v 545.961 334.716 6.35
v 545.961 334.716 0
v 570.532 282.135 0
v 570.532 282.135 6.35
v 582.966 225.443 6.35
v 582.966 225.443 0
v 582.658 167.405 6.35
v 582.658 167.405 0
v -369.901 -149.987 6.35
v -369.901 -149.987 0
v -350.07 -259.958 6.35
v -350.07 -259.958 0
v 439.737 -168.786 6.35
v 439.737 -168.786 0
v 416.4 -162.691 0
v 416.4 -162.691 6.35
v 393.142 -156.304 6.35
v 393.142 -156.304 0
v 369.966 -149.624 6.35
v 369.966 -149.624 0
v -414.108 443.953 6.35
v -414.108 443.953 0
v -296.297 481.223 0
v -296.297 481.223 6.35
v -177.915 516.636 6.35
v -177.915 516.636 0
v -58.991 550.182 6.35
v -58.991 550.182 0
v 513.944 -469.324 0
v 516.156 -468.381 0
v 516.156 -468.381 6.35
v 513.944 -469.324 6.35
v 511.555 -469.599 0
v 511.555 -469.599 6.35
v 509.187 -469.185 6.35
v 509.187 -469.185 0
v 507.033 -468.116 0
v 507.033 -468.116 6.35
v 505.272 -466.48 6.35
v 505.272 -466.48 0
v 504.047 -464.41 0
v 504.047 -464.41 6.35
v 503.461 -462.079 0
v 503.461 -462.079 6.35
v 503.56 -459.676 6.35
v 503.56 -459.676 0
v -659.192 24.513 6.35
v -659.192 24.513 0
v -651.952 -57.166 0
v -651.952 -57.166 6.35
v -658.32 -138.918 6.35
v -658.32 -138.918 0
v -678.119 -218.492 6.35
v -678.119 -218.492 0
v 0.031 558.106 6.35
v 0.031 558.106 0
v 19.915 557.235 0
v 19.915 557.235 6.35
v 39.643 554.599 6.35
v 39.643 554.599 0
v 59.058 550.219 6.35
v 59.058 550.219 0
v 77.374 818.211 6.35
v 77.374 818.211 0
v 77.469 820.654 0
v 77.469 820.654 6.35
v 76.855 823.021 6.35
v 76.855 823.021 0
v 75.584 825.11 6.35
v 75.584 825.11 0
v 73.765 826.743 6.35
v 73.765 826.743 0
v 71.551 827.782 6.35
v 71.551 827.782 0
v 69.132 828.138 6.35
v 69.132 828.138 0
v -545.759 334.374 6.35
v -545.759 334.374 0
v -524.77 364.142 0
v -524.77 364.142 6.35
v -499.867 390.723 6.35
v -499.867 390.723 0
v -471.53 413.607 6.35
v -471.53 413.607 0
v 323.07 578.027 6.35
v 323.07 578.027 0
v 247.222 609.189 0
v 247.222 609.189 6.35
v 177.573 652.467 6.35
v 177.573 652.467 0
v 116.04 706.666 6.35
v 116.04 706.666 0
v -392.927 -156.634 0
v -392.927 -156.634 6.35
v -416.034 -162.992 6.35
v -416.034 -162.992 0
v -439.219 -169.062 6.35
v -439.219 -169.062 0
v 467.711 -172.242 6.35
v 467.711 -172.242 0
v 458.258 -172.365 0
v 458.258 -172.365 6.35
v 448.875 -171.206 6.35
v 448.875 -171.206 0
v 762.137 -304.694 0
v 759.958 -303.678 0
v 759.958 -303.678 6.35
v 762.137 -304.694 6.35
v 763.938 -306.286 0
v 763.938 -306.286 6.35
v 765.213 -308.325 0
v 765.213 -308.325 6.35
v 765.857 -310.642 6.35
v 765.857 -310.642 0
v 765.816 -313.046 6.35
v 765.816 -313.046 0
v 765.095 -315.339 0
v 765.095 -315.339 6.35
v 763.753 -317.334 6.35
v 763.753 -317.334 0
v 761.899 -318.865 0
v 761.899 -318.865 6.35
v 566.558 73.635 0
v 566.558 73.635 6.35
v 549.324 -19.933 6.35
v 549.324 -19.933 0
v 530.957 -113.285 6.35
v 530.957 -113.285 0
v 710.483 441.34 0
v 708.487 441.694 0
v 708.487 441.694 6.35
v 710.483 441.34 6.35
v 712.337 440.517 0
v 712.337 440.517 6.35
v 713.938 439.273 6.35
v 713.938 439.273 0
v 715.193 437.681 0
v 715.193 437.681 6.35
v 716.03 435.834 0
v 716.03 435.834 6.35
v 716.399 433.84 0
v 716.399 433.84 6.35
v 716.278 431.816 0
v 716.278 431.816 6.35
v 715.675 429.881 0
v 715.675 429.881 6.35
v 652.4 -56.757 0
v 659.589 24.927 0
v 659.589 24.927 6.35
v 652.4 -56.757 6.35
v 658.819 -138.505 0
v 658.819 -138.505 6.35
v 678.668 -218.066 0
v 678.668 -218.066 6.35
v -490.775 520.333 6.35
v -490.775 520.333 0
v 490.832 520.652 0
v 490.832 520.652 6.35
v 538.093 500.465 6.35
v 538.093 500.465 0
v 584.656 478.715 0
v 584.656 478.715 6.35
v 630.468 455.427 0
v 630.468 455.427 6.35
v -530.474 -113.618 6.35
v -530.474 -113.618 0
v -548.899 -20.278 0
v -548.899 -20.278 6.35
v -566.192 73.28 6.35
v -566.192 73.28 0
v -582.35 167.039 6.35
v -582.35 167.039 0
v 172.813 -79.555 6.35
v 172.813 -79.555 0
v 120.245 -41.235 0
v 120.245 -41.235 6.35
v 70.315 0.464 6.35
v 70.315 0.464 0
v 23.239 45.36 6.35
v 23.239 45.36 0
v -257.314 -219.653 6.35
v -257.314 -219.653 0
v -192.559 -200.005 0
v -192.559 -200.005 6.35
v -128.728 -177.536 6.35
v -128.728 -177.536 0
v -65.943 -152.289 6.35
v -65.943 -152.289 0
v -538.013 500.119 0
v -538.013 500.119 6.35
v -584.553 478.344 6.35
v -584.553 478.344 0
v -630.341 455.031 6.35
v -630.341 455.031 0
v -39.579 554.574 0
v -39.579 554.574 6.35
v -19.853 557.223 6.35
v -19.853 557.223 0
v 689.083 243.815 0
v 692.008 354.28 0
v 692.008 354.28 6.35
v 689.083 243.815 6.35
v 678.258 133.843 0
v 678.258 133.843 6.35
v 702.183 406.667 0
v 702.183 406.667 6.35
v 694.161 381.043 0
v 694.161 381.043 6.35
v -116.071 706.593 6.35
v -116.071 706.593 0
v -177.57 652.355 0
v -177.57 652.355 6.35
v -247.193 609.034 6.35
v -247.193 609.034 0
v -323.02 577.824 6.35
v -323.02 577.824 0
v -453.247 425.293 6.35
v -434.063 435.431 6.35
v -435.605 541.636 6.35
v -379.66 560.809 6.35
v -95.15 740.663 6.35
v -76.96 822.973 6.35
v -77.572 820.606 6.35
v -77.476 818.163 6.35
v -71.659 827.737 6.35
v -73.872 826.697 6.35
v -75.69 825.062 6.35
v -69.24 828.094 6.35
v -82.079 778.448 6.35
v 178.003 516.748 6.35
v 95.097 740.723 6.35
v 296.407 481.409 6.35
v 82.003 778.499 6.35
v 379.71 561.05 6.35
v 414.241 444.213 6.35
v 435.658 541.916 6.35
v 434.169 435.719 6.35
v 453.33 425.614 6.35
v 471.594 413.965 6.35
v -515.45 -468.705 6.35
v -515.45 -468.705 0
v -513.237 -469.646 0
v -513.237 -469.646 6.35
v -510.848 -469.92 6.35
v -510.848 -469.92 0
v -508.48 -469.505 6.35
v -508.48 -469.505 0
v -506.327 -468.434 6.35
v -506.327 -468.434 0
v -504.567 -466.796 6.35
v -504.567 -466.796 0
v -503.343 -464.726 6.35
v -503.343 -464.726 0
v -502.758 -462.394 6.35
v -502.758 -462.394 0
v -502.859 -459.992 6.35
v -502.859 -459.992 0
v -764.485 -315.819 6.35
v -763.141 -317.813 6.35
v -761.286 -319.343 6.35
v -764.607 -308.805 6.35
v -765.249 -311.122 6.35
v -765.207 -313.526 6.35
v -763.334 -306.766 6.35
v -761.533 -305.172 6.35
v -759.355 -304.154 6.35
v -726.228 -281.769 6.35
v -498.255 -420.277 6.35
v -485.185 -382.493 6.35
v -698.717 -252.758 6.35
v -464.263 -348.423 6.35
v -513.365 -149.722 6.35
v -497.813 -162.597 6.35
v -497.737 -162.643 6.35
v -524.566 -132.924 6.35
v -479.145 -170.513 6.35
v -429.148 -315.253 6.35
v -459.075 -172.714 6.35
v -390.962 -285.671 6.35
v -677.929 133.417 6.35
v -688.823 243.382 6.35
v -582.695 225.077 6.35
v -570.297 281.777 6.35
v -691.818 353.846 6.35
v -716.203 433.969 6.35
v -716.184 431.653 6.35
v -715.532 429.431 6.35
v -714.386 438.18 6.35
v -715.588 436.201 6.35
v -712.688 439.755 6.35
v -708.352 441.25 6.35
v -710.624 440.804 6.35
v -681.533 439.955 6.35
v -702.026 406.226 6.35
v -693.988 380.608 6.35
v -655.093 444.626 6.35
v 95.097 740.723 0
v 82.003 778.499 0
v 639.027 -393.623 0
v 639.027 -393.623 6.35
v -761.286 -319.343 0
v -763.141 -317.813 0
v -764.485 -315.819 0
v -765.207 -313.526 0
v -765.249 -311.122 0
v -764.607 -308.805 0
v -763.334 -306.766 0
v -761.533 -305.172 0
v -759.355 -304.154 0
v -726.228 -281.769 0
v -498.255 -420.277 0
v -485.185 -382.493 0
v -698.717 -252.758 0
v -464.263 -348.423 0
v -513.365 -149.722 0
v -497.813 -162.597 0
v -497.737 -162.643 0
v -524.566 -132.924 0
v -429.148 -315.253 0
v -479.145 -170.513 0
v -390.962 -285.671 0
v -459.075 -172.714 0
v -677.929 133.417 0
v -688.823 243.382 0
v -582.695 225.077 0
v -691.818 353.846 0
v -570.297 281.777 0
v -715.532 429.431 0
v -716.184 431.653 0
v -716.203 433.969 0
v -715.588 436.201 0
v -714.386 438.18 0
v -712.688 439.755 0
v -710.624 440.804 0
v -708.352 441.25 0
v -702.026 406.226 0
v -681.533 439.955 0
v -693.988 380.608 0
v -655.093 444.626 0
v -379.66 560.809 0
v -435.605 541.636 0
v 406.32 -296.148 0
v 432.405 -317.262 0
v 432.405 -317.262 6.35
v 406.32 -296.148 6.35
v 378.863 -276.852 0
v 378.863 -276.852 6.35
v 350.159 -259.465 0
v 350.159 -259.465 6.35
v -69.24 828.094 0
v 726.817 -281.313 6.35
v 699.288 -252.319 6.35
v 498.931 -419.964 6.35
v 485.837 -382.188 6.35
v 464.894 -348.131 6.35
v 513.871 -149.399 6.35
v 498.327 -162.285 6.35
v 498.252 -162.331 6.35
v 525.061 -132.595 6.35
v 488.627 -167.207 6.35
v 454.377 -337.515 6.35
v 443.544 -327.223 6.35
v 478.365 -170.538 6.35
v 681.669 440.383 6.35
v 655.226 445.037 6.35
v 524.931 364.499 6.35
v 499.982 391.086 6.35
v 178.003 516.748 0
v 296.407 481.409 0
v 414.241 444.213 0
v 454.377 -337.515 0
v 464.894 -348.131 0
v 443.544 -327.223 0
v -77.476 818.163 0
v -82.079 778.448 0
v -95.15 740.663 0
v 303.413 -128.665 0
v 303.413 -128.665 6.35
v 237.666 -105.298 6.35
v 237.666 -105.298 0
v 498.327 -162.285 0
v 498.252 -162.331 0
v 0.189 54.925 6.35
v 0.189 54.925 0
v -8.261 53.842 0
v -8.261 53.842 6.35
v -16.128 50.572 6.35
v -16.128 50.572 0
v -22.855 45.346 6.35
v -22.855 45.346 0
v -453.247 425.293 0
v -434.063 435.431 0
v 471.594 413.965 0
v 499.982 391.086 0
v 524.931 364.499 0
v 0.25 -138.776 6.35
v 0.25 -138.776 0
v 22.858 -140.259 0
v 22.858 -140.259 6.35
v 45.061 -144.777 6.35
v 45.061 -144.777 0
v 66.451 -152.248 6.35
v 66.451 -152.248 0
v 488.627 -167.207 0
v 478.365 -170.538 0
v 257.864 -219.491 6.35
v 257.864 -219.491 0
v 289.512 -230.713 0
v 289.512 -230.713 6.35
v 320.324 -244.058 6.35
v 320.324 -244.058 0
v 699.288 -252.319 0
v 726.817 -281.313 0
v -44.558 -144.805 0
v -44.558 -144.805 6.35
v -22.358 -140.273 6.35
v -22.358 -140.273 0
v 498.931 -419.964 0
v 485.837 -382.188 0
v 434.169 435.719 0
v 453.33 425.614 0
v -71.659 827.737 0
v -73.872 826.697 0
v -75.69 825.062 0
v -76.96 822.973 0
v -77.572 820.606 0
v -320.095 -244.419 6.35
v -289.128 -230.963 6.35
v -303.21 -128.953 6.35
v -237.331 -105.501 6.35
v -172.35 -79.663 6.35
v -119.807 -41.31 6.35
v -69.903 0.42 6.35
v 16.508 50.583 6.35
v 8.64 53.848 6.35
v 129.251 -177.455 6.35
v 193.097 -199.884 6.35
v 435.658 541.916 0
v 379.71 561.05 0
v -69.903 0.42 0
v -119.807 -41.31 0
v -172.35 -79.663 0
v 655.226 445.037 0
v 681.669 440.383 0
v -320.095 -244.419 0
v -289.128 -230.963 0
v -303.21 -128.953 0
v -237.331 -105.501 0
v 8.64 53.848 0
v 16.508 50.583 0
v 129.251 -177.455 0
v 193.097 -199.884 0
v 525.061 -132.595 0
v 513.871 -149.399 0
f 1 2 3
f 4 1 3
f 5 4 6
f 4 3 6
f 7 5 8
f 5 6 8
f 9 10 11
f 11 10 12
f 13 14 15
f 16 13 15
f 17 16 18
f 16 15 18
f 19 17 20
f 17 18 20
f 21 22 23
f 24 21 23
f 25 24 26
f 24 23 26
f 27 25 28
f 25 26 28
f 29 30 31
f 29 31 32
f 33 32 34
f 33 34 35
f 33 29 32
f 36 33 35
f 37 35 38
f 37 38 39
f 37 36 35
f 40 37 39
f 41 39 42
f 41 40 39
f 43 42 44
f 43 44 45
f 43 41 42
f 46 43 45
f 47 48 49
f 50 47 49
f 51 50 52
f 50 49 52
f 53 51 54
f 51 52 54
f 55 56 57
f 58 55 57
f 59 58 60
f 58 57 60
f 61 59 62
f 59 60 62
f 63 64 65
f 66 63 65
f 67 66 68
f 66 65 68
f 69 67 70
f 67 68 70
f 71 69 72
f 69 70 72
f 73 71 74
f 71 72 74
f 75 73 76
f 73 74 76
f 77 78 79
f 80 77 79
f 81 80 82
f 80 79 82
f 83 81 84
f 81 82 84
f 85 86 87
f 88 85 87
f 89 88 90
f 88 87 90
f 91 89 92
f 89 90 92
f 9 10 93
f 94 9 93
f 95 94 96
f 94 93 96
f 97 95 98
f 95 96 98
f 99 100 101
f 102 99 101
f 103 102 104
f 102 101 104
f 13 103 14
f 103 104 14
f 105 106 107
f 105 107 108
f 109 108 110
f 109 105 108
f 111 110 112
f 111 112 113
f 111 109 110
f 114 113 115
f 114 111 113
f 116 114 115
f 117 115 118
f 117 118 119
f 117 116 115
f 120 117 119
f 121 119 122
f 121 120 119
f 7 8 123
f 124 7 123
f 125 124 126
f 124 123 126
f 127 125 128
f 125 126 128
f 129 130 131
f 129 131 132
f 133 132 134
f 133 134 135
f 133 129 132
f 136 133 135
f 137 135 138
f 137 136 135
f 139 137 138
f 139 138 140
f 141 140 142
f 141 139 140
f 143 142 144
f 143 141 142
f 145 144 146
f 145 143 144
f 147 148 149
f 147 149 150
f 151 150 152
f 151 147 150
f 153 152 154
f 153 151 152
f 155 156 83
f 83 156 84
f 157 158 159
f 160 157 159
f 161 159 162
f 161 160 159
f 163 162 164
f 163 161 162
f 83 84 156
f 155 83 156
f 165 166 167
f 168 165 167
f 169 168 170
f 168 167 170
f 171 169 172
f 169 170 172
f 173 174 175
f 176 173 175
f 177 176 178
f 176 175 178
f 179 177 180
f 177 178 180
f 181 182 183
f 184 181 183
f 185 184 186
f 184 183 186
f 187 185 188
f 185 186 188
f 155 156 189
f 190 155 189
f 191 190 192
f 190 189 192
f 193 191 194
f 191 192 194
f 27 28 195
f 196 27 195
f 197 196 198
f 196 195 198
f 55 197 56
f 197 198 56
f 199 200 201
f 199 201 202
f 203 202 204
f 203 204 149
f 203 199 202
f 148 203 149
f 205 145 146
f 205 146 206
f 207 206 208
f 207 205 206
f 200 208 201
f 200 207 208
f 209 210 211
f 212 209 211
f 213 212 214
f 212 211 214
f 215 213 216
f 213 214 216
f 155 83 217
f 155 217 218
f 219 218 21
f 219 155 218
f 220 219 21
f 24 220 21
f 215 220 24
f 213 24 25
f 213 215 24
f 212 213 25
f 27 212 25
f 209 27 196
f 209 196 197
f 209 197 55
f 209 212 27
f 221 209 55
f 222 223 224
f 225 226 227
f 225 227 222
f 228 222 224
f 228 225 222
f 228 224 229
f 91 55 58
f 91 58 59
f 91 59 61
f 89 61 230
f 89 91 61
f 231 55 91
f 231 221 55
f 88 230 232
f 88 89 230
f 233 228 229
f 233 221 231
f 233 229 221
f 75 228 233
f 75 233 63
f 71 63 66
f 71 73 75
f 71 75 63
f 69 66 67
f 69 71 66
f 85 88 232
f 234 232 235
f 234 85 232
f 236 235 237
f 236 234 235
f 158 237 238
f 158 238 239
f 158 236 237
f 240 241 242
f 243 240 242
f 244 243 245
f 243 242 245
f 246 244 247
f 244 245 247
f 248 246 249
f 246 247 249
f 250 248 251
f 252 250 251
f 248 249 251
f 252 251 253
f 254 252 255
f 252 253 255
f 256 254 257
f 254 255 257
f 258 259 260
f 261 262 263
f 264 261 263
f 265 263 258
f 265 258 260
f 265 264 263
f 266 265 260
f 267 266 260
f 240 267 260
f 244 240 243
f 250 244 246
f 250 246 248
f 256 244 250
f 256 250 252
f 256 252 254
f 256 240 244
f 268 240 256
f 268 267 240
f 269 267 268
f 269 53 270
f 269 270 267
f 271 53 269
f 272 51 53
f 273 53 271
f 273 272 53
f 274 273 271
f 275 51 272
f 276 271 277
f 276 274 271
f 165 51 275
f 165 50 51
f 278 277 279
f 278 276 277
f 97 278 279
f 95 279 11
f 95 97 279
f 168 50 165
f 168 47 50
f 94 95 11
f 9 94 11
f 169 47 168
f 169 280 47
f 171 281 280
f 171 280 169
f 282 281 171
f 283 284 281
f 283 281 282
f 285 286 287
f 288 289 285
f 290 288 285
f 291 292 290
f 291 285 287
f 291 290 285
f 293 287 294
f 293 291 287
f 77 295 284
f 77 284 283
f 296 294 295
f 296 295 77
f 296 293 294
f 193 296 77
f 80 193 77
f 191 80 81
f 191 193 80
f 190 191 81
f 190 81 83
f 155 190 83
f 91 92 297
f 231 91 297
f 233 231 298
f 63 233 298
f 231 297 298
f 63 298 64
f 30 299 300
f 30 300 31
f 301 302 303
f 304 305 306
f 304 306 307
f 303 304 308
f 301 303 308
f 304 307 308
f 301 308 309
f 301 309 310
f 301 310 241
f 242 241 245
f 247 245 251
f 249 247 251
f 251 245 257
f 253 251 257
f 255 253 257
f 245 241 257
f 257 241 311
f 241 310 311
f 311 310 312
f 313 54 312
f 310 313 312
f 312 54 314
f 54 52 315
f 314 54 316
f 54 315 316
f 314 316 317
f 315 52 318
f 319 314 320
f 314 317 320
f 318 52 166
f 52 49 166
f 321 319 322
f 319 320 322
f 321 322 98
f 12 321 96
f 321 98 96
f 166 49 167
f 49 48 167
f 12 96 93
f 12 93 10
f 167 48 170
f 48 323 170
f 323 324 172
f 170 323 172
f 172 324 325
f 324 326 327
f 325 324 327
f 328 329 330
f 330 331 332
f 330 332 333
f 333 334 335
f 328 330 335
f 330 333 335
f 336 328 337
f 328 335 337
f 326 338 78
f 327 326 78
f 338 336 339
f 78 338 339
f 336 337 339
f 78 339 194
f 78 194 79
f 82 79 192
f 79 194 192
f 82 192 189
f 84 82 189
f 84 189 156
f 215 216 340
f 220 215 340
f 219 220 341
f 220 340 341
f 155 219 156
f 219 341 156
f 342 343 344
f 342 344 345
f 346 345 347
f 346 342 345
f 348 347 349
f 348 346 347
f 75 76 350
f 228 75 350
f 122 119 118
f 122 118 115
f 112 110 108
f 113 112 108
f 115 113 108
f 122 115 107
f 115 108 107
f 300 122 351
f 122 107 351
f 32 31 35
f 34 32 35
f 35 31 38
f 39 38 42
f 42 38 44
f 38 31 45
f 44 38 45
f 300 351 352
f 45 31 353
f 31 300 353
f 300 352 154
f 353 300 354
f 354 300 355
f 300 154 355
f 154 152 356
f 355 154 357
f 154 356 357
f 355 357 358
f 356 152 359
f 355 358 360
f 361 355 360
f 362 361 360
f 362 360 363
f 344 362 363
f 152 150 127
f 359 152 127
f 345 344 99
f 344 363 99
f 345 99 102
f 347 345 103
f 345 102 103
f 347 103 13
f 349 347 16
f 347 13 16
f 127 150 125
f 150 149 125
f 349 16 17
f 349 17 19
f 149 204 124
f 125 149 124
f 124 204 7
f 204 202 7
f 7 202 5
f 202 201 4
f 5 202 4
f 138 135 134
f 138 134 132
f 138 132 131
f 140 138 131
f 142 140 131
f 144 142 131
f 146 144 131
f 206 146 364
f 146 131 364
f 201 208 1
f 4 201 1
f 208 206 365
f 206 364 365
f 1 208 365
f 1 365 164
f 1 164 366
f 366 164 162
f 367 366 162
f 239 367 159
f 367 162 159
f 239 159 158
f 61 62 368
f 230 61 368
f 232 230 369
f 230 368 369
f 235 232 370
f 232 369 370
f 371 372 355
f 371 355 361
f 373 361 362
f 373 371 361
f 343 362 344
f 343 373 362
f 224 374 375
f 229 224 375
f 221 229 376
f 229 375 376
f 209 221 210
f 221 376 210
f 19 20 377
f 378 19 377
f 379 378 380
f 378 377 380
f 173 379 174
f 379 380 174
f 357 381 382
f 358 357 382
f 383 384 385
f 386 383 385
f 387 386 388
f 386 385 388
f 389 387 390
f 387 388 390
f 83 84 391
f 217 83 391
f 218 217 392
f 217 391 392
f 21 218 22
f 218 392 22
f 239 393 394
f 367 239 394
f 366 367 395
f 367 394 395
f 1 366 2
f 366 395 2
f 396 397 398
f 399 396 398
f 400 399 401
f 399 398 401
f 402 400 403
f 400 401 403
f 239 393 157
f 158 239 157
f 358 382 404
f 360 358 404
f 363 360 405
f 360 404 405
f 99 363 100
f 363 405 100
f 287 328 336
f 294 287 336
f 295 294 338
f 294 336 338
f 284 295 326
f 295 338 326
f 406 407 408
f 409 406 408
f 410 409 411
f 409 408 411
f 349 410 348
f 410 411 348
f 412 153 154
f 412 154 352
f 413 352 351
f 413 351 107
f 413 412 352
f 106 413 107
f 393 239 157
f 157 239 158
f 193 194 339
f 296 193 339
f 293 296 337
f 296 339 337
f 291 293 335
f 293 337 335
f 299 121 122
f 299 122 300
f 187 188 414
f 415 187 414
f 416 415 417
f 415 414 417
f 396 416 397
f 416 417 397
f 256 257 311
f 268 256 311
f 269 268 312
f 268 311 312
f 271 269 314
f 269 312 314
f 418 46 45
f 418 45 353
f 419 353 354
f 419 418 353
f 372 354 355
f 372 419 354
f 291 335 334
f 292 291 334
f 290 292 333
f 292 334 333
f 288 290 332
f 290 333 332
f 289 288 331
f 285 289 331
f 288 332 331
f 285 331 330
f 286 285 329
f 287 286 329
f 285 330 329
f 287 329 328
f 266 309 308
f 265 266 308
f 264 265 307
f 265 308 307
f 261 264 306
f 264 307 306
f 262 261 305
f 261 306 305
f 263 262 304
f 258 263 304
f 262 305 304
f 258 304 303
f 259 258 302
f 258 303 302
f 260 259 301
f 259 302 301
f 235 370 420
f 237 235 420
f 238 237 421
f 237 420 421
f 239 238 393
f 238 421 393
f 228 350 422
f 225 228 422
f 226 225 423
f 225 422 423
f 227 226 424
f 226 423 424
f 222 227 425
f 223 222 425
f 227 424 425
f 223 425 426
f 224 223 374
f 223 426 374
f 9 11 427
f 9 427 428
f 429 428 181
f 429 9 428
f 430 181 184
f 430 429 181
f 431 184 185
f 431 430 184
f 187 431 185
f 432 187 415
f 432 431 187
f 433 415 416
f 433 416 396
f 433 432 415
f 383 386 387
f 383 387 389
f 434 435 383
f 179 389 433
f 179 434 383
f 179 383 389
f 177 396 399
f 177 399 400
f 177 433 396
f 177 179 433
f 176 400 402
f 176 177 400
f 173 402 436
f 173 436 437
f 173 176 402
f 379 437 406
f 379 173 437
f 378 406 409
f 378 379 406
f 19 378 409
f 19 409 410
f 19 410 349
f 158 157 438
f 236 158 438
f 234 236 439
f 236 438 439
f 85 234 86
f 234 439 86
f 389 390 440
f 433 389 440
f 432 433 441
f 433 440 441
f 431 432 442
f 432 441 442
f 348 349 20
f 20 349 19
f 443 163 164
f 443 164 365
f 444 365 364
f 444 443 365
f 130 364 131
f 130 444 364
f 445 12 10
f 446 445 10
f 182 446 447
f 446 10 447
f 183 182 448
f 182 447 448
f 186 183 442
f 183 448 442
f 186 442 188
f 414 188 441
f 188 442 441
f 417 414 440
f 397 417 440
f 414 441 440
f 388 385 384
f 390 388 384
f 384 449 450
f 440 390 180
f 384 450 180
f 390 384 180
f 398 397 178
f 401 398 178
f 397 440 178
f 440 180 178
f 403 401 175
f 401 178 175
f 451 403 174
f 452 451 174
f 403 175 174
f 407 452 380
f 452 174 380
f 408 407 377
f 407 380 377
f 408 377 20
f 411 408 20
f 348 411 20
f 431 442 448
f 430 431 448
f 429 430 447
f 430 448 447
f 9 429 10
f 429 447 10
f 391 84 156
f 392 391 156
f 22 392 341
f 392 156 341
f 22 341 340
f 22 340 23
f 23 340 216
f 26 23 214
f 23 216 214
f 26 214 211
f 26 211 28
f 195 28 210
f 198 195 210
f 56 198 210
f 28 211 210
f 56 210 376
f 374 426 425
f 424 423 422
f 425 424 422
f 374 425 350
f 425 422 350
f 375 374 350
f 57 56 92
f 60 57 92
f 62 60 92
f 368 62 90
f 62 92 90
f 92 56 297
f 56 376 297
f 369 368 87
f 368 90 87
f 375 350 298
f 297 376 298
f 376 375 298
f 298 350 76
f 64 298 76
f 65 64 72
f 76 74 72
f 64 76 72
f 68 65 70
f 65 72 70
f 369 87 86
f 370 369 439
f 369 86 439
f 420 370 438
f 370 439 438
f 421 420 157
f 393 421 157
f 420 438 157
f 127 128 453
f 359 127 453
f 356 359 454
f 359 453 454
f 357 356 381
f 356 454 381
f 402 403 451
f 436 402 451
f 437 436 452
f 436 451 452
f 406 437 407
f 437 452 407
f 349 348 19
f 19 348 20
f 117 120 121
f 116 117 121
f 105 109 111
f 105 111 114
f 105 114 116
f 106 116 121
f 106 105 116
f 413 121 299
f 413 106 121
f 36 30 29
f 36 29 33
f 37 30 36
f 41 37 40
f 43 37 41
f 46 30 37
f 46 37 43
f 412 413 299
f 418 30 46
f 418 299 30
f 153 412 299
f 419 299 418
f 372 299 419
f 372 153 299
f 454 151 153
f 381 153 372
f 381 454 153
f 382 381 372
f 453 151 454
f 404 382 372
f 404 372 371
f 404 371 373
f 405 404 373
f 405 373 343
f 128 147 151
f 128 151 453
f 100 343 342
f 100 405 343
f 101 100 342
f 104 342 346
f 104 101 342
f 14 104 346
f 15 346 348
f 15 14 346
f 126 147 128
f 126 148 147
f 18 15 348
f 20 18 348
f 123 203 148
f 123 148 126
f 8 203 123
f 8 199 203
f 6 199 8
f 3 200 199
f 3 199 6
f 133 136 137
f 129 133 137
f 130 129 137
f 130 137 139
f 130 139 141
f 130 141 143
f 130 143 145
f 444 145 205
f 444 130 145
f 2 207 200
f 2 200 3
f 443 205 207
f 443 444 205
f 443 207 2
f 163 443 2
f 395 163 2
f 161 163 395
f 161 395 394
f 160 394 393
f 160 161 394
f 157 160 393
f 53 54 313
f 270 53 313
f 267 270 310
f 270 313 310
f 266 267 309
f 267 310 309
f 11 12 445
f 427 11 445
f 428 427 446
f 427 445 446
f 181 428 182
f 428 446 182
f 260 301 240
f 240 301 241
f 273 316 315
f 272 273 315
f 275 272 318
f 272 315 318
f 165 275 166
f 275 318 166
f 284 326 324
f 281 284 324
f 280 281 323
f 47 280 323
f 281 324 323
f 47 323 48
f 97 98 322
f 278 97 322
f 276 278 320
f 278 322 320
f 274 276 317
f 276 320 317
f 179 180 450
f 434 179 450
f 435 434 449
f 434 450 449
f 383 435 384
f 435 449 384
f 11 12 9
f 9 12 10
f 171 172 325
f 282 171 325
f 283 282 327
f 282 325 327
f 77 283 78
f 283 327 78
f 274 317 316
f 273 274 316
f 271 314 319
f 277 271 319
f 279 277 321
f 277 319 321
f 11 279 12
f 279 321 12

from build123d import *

# Parameters (mm, degrees)
BOSS_EXTRUDE1_DEPTH = 6.35
SPLIT1_DEPTH        = 6.35
SPLIT1_2_DEPTH      = 6.35
SPLIT1_3_DEPTH      = 6.35
SPLIT1_START        = -781.857853319
SPLIT1_4_OUTLINE_W  = 1287
SPLIT1_4_OUTLINE_H  = 6.35
SPLIT1_4_DEPTH      = 1172.504299698
SPLIT1_5_DEPTH      = 6.35


# Read off the part's stored shape, not the designer's step: Split1
with BuildPart() as part:
    # Model → Boss-Extrude1 (new body)
    with BuildSketch(Plane.XY):
        with BuildLine():
            Line((-638.367984426, -394.024277033), (-761.286388803, -319.34348417))
            ThreePointArc((-761.286388803, -319.34348417), (-765.249363496, -311.122215453), (-759.354942783, -304.154415787))
            ThreePointArc((-759.354942783, -304.154415787), (-711.682656668, -268.012776159), (-678.11913533, -218.491517958))
            ThreePointArc((-678.11913533, -218.491517958), (-653.437019788, -98.174481805), (-659.191883423, 24.513241952))
            ThreePointArc((-659.191883423, 24.513241952), (-684.361343993, 188.302016317), (-691.817988241, 353.845553823))
            ThreePointArc((-691.817988241, 353.845553823), (-697.291676319, 393.64117056), (-715.532221879, 429.431321025))
            ThreePointArc((-715.532221879, 429.431321025), (-716.258813808, 433.39071274), (-715.055826906, 437.232267256))
            ThreePointArc((-715.055826906, 437.232267256), (-712.200696082, 440.070038663), (-708.351876516, 441.249575239))
            ThreePointArc((-708.351876516, 441.249575239), (-668.182723515, 441.552097781), (-630.341335993, 455.031035538))
            ThreePointArc((-630.341335993, 455.031035538), (-479.982990088, 524.691872238), (-323.020358084, 577.823750686))
            ThreePointArc((-323.020358084, 577.823750686), (-230.775363979, 617.841419704), (-148.541225202, 675.704181397))
            ThreePointArc((-148.541225202, 675.704181397), (-131.955777097, 690.780334317), (-116.071063152, 706.593093045))
            ThreePointArc((-116.071063152, 706.593093045), (-87.585480923, 759.199524054), (-77.475520929, 818.162679392))
            ThreePointArc((-77.475520929, 818.162679392), (-75.690066507, 825.062407002), (-69.240090661, 828.09422167))
            Line((-69.240090661, 828.09422167), (-0.053809914, 828.115937465))
            Line((-0.053809914, 828.115937465), (69.132470832, 828.13765326))
            ThreePointArc((69.132470832, 828.13765326), (75.584348625, 825.109888153), (77.374133989, 818.211282718))
            ThreePointArc((77.374133989, 818.211282718), (87.521106024, 759.254485511), (116.039706251, 706.665946649))
            ThreePointArc((116.039706251, 706.665946649), (131.934343502, 690.863162642), (148.529252371, 675.797424183))
            ThreePointArc((148.529252371, 675.797424183), (230.799698209, 617.986296251), (323.069795171, 578.026541777))
            ThreePointArc((323.069795171, 578.026541777), (480.065749707, 524.993206857), (630.467795476, 455.426771113))
            ThreePointArc((630.467795476, 455.426771113), (668.317636924, 441.971590887), (708.486971917, 441.694284532))
            ThreePointArc((708.486971917, 441.694284532), (712.336531177, 440.517164279), (715.193442845, 437.681185735))
            ThreePointArc((715.193442845, 437.681185735), (716.39884104, 433.84038715), (715.674734757, 429.880540098))
            ThreePointArc((715.674734757, 429.880540098), (697.456660005, 394.078946209), (692.007954645, 354.279901214))
            ThreePointArc((692.007954645, 354.279901214), (684.655231578, 188.731715428), (659.588594129, 24.927173243))
            ThreePointArc((659.588594129, 24.927173243), (653.910748666, -97.764138948), (678.668388186, -218.065657232))
            ThreePointArc((678.668388186, -218.065657232), (712.262989808, -267.565836225), (759.957954391, -303.677542524))
            ThreePointArc((759.957954391, -303.677542524), (765.856747968, -310.641640604), (761.898934945, -318.865395452))
            Line((761.898934945, -318.865395452), (639.027435546, -393.623335448))
            Line((639.027435546, -393.623335448), (516.155936146, -468.381275443))
            ThreePointArc((516.155936146, -468.381275443), (507.033213291, -468.116029452), (503.559898784, -459.67621227))
            ThreePointArc((503.559898784, -459.67621227), (493.412926748, -400.719415063), (464.894326522, -348.130876201))
            ThreePointArc((464.894326522, -348.130876201), (448.999689271, -332.328092194), (432.404780401, -317.262353736))
            ThreePointArc((432.404780401, -317.262353736), (350.134334566, -259.451225805), (257.864237607, -219.491471331))
            ThreePointArc((257.864237607, -219.491471331), (161.051005017, -189.019470039), (66.450908428, -152.247652124))
            ThreePointArc((66.450908428, -152.247652124), (34.035926816, -142.142455336), (0.249672515, -138.775697944))
            ThreePointArc((0.249672515, -138.775697944), (-33.534461653, -142.163663944), (-65.943093355, -152.289207198))
            ThreePointArc((-65.943093355, -152.289207198), (-160.520087849, -189.120402938), (-257.314172608, -219.65317259))
            ThreePointArc((-257.314172608, -219.65317259), (-349.559166711, -259.670841607), (-431.793305487, -317.533603299))
            ThreePointArc((-431.793305487, -317.533603299), (-448.378753592, -332.609756219), (-464.263467537, -348.422514947))
            ThreePointArc((-464.263467537, -348.422514947), (-492.749049766, -401.028945956), (-502.85900976, -459.992101294))
            ThreePointArc((-502.85900976, -459.992101294), (-506.3270255, -468.434097181), (-515.44958005, -468.705069896))
            Line((-515.44958005, -468.705069896), (-638.367984426, -394.024277033))
        make_face()
        with BuildLine():
            Line((498.327267896, -162.284661886), (498.251688628, -162.330646108))
            ThreePointArc((498.251688628, -162.330646108), (483.560543344, -169.071747961), (467.710528036, -172.24179822))
            ThreePointArc((467.710528036, -172.24179822), (453.546867564, -171.944869226), (439.736818999, -168.78575489))
            ThreePointArc((439.736818999, -168.78575489), (304.635311179, -129.074166548), (172.812587553, -79.55450177))
            ThreePointArc((172.812587553, -79.55450177), (94.93620934, -20.796551659), (23.238928571, 45.360284081))
            ThreePointArc((23.238928571, 45.360284081), (12.682899079, 52.47774836), (0.188874949, 54.924668346))
            ThreePointArc((0.188874949, 54.924668346), (-12.303610669, 52.469905737), (-22.855170103, 45.345816329))
            ThreePointArc((-22.855170103, 45.345816329), (-94.510906889, -20.856014238), (-172.35038454, -79.662839553))
            ThreePointArc((-172.35038454, -79.662839553), (-304.141996297, -129.265246094), (-439.218548607, -169.061636385))
            ThreePointArc((-439.218548607, -169.061636385), (-453.026611322, -172.229419336), (-467.190082606, -172.535239489))
            ThreePointArc((-467.190082606, -172.535239489), (-483.042084786, -169.375139678), (-497.737458891, -162.643261498))
            Line((-497.737458891, -162.643261498), (-497.813067011, -162.59732473))
            ThreePointArc((-497.813067011, -162.59732473), (-519.577528179, -141.73147249), (-530.473668716, -113.618313986))
            ThreePointArc((-530.473668716, -113.618313986), (-557.686932125, 26.474784935), (-582.350395553, 167.03918883))
            ThreePointArc((-582.350395553, 167.03918883), (-578.065588789, 253.770219076), (-545.759236039, 334.373759622))
            ThreePointArc((-545.759236039, 334.373759622), (-489.108364583, 400.186447909), (-414.107553732, 443.952982479))
            ThreePointArc((-414.107553732, 443.952982479), (-237.176009353, 499.162492838), (-58.991018122, 550.181806148))
            ThreePointArc((-58.991018122, 550.181806148), (-29.745116882, 556.118351155), (0.030939182, 558.106262423))
            ThreePointArc((0.030939182, 558.106262423), (29.808237287, 556.137043422), (59.057859422, 550.218858656))
            ThreePointArc((59.057859422, 550.218858656), (237.274842843, 499.311410764), (414.241010049, 444.2129798))
            ThreePointArc((414.241010049, 444.2129798), (489.2692805, 400.493535502), (545.961454613, 334.716422682))
            ThreePointArc((545.961454613, 334.716422682), (578.318399751, 254.133178284), (582.657650946, 167.404854908))
            ThreePointArc((582.657650946, 167.404854908), (558.082431475, 26.824996256), (530.957116664, -113.285158148))
            ThreePointArc((530.957116664, -113.285158148), (520.078626268, -141.405151149), (498.327267896, -162.284661886))
        make_face(mode=Mode.SUBTRACT)
    extrude(amount=BOSS_EXTRUDE1_DEPTH)

    # Split1 4 outline → Split1 4 (cut)
    with BuildSketch(Plane(origin=(0, 0, 0), x_dir=(0.17746085670516612, 0.9841278597506874, 0), z_dir=(0.9841278597506874, -0.1774608567051661, 0)).offset(SPLIT1_START)):
        with Locations((121.5, 3.175)):
            Rectangle(SPLIT1_4_OUTLINE_W, SPLIT1_4_OUTLINE_H)
    extrude(amount=SPLIT1_4_DEPTH, mode=Mode.SUBTRACT)

    # Split1 5 outline → Split1 5 (cut)
    with BuildSketch(Plane.XY):
        with BuildLine():
            ThreePointArc((-65.943093355, -152.289207198), (-33.534461652, -142.163663944), (0.249672515, -138.775697944))
            ThreePointArc((0.249672515, -138.775697944), (34.035926816, -142.142455336), (66.450908428, -152.247652124))
            ThreePointArc((66.450908428, -152.247652124), (161.051005017, -189.019470039), (257.864237607, -219.491471331))
            ThreePointArc((257.864237607, -219.491471331), (305.031494723, -237.123910925), (350.159304792, -259.465214113))
            Line((350.159304792, -259.465214113), (369.966150257, -149.62426779))
            ThreePointArc((369.966150257, -149.62426779), (270.432887756, -117.280612064), (172.812587553, -79.55450177))
            ThreePointArc((172.812587553, -79.55450177), (94.93620934, -20.796551659), (23.238928571, 45.360284081))
            ThreePointArc((23.238928571, 45.360284081), (12.682899079, 52.47774836), (0.188874949, 54.924668346))
            ThreePointArc((0.188874949, 54.924668346), (-12.303610669, 52.469905737), (-22.855170103, 45.345816329))
            ThreePointArc((-22.855170103, 45.345816329), (-94.510906889, -20.856014238), (-172.35038454, -79.662839553))
            ThreePointArc((-172.35038454, -79.662839553), (-304.141996297, -129.265246094), (-439.218548607, -169.061636385))
            ThreePointArc((-439.218548607, -169.061636385), (-469.190114459, -172.345049244), (-497.737458891, -162.643261498))
            Line((-497.737458891, -162.643261498), (-497.813067011, -162.59732473))
            ThreePointArc((-497.813067011, -162.59732473), (-519.577528179, -141.73147249), (-530.473668716, -113.618313986))
            ThreePointArc((-530.473668716, -113.618313986), (-557.686932125, 26.474784935), (-582.350395553, 167.03918883))
            ThreePointArc((-582.350395553, 167.03918883), (-578.065588789, 253.770219076), (-545.759236039, 334.373759622))
            ThreePointArc((-545.759236039, 334.373759622), (-489.108364582, 400.18644791), (-414.107553732, 443.952982479))
            ThreePointArc((-414.107553732, 443.952982479), (-237.176009353, 499.162492838), (-58.991018122, 550.181806148))
            ThreePointArc((-58.991018122, 550.181806148), (-29.745116882, 556.118351155), (0.030939182, 558.106262423))
            ThreePointArc((0.030939182, 558.106262423), (29.808237287, 556.137043422), (59.057859422, 550.218858656))
            ThreePointArc((59.057859422, 550.218858656), (237.274842843, 499.311410764), (414.241010049, 444.2129798))
            ThreePointArc((414.241010049, 444.2129798), (443.853765702, 430.863982072), (471.59422819, 413.964935392))
            Line((471.59422819, 413.964935392), (490.832378328, 520.652121925))
            ThreePointArc((490.832378328, 520.652121925), (407.775994413, 551.751358688), (323.069795171, 578.026541777))
            ThreePointArc((323.069795171, 578.026541777), (211.498540436, 629.38071525), (116.039706251, 706.665946649))
            ThreePointArc((116.039706251, 706.665946649), (87.521106024, 759.25448551), (77.374133989, 818.211282718))
            ThreePointArc((77.374133989, 818.211282718), (75.584348625, 825.109888153), (69.132470832, 828.13765326))
            Line((69.132470832, 828.13765326), (-69.240090661, 828.09422167))
            ThreePointArc((-69.240090661, 828.09422167), (-75.690066507, 825.062407002), (-77.475520929, 818.162679392))
            ThreePointArc((-77.475520929, 818.162679392), (-87.585480923, 759.199524054), (-116.071063152, 706.593093045))
            ThreePointArc((-116.071063152, 706.593093045), (-211.481362839, 629.247952732), (-323.020358084, 577.823750686))
            ThreePointArc((-323.020358084, 577.823750686), (-479.982990088, 524.691872238), (-630.341335993, 455.031035538))
            ThreePointArc((-630.341335993, 455.031035538), (-668.182723515, 441.552097781), (-708.351876516, 441.249575239))
            ThreePointArc((-708.351876516, 441.249575239), (-715.055826906, 437.232267256), (-715.532221879, 429.431321025))
            ThreePointArc((-715.532221879, 429.431321025), (-697.291676319, 393.64117056), (-691.817988241, 353.845553823))
            ThreePointArc((-691.817988241, 353.845553823), (-684.361343993, 188.302016317), (-659.191883423, 24.513241952))
            ThreePointArc((-659.191883423, 24.513241952), (-653.437019788, -98.174481805), (-678.11913533, -218.491517958))
            ThreePointArc((-678.11913533, -218.491517958), (-711.682656668, -268.012776159), (-759.354942783, -304.154415787))
            ThreePointArc((-759.354942783, -304.154415787), (-765.249363496, -311.122215453), (-761.286388803, -319.34348417))
            Line((-761.286388803, -319.34348417), (-515.44958005, -468.705069896))
            ThreePointArc((-515.44958005, -468.705069896), (-506.3270255, -468.434097181), (-502.85900976, -459.992101294))
            ThreePointArc((-502.85900976, -459.992101294), (-492.749049766, -401.028945956), (-464.263467537, -348.422514947))
            ThreePointArc((-464.263467537, -348.422514947), (-368.853167852, -271.077374635), (-257.314172608, -219.65317259))
            ThreePointArc((-257.314172608, -219.65317259), (-160.520087849, -189.120402938), (-65.943093355, -152.289207198))
        make_face()
    extrude(amount=SPLIT1_5_DEPTH, mode=Mode.SUBTRACT)


with BuildPart() as body_2:
    # Split1 outline → Split1 (new body)
    with BuildSketch(Plane.XY):
        with BuildLine():
            ThreePointArc((-464.263467537, -348.422514947), (-410.417039433, -299.994956425), (-350.070434299, -259.958054786))
            Line((-350.070434299, -259.958054786), (-369.900800355, -149.98667255))
            ThreePointArc((-369.900800355, -149.98667255), (-404.470264766, -159.849066229), (-439.218548607, -169.061636385))
            ThreePointArc((-439.218548607, -169.061636385), (-469.190114459, -172.345049244), (-497.737458891, -162.643261498))
            Line((-497.737458891, -162.643261498), (-497.813067011, -162.59732473))
            ThreePointArc((-497.813067011, -162.59732473), (-519.577528179, -141.73147249), (-530.473668716, -113.618313986))
            ThreePointArc((-530.473668716, -113.618313986), (-557.686932125, 26.474784935), (-582.350395553, 167.03918883))
            ThreePointArc((-582.350395553, 167.03918883), (-578.065588789, 253.770219076), (-545.759236039, 334.373759622))
            ThreePointArc((-545.759236039, 334.373759622), (-512.779474489, 377.864428576), (-471.529768148, 413.607465447))
            Line((-471.529768148, 413.607465447), (-490.774769517, 520.332646195))
            ThreePointArc((-490.774769517, 520.332646195), (-561.373841233, 489.425393525), (-630.341335993, 455.031035538))
            ThreePointArc((-630.341335993, 455.031035538), (-668.182723515, 441.552097781), (-708.351876516, 441.249575239))
            ThreePointArc((-708.351876516, 441.249575239), (-715.055826906, 437.232267256), (-715.532221879, 429.431321025))
            ThreePointArc((-715.532221879, 429.431321025), (-697.291676319, 393.64117056), (-691.817988241, 353.845553823))
            ThreePointArc((-691.817988241, 353.845553823), (-684.361343993, 188.302016317), (-659.191883423, 24.513241952))
            ThreePointArc((-659.191883423, 24.513241952), (-653.437019788, -98.174481805), (-678.11913533, -218.491517958))
            ThreePointArc((-678.11913533, -218.491517958), (-711.682656668, -268.012776159), (-759.354942783, -304.154415787))
            ThreePointArc((-759.354942783, -304.154415787), (-765.249363496, -311.122215453), (-761.286388803, -319.34348417))
            Line((-761.286388803, -319.34348417), (-515.44958005, -468.705069896))
            ThreePointArc((-515.44958005, -468.705069896), (-506.3270255, -468.434097181), (-502.85900976, -459.992101294))
            ThreePointArc((-502.85900976, -459.992101294), (-492.749049766, -401.028945956), (-464.263467537, -348.422514947))
        make_face()
    extrude(amount=SPLIT1_DEPTH)


with BuildPart() as body_3:
    # Split1 2 outline → Split1 2 (new body)
    with BuildSketch(Plane.XY):
        with BuildLine():
            Line((-369.900800355, -149.98667255), (-350.070434299, -259.958054786))
            ThreePointArc((-350.070434299, -259.958054786), (-304.726176416, -237.426294216), (-257.314172608, -219.65317259))
            ThreePointArc((-257.314172608, -219.65317259), (-160.520087849, -189.120402938), (-65.943093355, -152.289207198))
            ThreePointArc((-65.943093355, -152.289207198), (-33.534461652, -142.163663944), (0.249672515, -138.775697944))
            ThreePointArc((0.249672515, -138.775697944), (34.035926816, -142.142455336), (66.450908428, -152.247652124))
            ThreePointArc((66.450908428, -152.247652124), (161.051005017, -189.019470039), (257.864237607, -219.491471331))
            ThreePointArc((257.864237607, -219.491471331), (305.031494723, -237.123910924), (350.159304792, -259.465214113))
            Line((350.159304792, -259.465214113), (369.966150257, -149.62426779))
            ThreePointArc((369.966150257, -149.62426779), (270.432887757, -117.280612064), (172.812587553, -79.55450177))
            ThreePointArc((172.812587553, -79.55450177), (94.93620934, -20.796551659), (23.238928571, 45.360284081))
            ThreePointArc((23.238928571, 45.360284081), (12.682899079, 52.47774836), (0.188874949, 54.924668346))
            ThreePointArc((0.188874949, 54.924668346), (-12.303610669, 52.469905737), (-22.855170103, 45.345816329))
            ThreePointArc((-22.855170103, 45.345816329), (-94.510906889, -20.856014238), (-172.35038454, -79.662839553))
            ThreePointArc((-172.35038454, -79.662839553), (-270.163533959, -117.52732567), (-369.900800355, -149.98667255))
        make_face()
    extrude(amount=SPLIT1_2_DEPTH)


with BuildPart() as body_4:
    # Split1 3 outline → Split1 3 (new body)
    with BuildSketch(Plane.XY):
        with BuildLine():
            Line((-490.774769517, 520.332646195), (-471.529768148, 413.607465447))
            ThreePointArc((-471.529768148, 413.607465447), (-443.759378978, 430.560325874), (-414.107553732, 443.952982479))
            ThreePointArc((-414.107553732, 443.952982479), (-237.176009353, 499.162492838), (-58.991018122, 550.181806148))
            ThreePointArc((-58.991018122, 550.181806148), (-29.745116882, 556.118351155), (0.030939182, 558.106262423))
            ThreePointArc((0.030939182, 558.106262423), (29.808237287, 556.137043422), (59.057859422, 550.218858656))
            ThreePointArc((59.057859422, 550.218858656), (237.274842843, 499.311410764), (414.241010049, 444.2129798))
            ThreePointArc((414.241010049, 444.2129798), (443.853765702, 430.863982071), (471.59422819, 413.964935392))
            Line((471.59422819, 413.964935392), (490.832378328, 520.652121925))
            ThreePointArc((490.832378328, 520.652121925), (407.775994413, 551.751358688), (323.069795171, 578.026541777))
            ThreePointArc((323.069795171, 578.026541777), (211.498540436, 629.38071525), (116.039706251, 706.665946649))
            ThreePointArc((116.039706251, 706.665946649), (87.521106024, 759.25448551), (77.374133989, 818.211282718))
            ThreePointArc((77.374133989, 818.211282718), (75.584348625, 825.109888153), (69.132470832, 828.13765326))
            Line((69.132470832, 828.13765326), (-69.240090661, 828.09422167))
            ThreePointArc((-69.240090661, 828.09422167), (-75.690066507, 825.062407002), (-77.475520929, 818.162679392))
            ThreePointArc((-77.475520929, 818.162679392), (-87.585480923, 759.199524054), (-116.071063152, 706.593093045))
            ThreePointArc((-116.071063152, 706.593093045), (-211.481362839, 629.247952732), (-323.020358084, 577.823750686))
            ThreePointArc((-323.020358084, 577.823750686), (-407.724289496, 551.49051742), (-490.774769517, 520.332646195))
        make_face()
    extrude(amount=SPLIT1_3_DEPTH)


solid = Compound([part.part, body_2.part, body_3.part, body_4.part])
